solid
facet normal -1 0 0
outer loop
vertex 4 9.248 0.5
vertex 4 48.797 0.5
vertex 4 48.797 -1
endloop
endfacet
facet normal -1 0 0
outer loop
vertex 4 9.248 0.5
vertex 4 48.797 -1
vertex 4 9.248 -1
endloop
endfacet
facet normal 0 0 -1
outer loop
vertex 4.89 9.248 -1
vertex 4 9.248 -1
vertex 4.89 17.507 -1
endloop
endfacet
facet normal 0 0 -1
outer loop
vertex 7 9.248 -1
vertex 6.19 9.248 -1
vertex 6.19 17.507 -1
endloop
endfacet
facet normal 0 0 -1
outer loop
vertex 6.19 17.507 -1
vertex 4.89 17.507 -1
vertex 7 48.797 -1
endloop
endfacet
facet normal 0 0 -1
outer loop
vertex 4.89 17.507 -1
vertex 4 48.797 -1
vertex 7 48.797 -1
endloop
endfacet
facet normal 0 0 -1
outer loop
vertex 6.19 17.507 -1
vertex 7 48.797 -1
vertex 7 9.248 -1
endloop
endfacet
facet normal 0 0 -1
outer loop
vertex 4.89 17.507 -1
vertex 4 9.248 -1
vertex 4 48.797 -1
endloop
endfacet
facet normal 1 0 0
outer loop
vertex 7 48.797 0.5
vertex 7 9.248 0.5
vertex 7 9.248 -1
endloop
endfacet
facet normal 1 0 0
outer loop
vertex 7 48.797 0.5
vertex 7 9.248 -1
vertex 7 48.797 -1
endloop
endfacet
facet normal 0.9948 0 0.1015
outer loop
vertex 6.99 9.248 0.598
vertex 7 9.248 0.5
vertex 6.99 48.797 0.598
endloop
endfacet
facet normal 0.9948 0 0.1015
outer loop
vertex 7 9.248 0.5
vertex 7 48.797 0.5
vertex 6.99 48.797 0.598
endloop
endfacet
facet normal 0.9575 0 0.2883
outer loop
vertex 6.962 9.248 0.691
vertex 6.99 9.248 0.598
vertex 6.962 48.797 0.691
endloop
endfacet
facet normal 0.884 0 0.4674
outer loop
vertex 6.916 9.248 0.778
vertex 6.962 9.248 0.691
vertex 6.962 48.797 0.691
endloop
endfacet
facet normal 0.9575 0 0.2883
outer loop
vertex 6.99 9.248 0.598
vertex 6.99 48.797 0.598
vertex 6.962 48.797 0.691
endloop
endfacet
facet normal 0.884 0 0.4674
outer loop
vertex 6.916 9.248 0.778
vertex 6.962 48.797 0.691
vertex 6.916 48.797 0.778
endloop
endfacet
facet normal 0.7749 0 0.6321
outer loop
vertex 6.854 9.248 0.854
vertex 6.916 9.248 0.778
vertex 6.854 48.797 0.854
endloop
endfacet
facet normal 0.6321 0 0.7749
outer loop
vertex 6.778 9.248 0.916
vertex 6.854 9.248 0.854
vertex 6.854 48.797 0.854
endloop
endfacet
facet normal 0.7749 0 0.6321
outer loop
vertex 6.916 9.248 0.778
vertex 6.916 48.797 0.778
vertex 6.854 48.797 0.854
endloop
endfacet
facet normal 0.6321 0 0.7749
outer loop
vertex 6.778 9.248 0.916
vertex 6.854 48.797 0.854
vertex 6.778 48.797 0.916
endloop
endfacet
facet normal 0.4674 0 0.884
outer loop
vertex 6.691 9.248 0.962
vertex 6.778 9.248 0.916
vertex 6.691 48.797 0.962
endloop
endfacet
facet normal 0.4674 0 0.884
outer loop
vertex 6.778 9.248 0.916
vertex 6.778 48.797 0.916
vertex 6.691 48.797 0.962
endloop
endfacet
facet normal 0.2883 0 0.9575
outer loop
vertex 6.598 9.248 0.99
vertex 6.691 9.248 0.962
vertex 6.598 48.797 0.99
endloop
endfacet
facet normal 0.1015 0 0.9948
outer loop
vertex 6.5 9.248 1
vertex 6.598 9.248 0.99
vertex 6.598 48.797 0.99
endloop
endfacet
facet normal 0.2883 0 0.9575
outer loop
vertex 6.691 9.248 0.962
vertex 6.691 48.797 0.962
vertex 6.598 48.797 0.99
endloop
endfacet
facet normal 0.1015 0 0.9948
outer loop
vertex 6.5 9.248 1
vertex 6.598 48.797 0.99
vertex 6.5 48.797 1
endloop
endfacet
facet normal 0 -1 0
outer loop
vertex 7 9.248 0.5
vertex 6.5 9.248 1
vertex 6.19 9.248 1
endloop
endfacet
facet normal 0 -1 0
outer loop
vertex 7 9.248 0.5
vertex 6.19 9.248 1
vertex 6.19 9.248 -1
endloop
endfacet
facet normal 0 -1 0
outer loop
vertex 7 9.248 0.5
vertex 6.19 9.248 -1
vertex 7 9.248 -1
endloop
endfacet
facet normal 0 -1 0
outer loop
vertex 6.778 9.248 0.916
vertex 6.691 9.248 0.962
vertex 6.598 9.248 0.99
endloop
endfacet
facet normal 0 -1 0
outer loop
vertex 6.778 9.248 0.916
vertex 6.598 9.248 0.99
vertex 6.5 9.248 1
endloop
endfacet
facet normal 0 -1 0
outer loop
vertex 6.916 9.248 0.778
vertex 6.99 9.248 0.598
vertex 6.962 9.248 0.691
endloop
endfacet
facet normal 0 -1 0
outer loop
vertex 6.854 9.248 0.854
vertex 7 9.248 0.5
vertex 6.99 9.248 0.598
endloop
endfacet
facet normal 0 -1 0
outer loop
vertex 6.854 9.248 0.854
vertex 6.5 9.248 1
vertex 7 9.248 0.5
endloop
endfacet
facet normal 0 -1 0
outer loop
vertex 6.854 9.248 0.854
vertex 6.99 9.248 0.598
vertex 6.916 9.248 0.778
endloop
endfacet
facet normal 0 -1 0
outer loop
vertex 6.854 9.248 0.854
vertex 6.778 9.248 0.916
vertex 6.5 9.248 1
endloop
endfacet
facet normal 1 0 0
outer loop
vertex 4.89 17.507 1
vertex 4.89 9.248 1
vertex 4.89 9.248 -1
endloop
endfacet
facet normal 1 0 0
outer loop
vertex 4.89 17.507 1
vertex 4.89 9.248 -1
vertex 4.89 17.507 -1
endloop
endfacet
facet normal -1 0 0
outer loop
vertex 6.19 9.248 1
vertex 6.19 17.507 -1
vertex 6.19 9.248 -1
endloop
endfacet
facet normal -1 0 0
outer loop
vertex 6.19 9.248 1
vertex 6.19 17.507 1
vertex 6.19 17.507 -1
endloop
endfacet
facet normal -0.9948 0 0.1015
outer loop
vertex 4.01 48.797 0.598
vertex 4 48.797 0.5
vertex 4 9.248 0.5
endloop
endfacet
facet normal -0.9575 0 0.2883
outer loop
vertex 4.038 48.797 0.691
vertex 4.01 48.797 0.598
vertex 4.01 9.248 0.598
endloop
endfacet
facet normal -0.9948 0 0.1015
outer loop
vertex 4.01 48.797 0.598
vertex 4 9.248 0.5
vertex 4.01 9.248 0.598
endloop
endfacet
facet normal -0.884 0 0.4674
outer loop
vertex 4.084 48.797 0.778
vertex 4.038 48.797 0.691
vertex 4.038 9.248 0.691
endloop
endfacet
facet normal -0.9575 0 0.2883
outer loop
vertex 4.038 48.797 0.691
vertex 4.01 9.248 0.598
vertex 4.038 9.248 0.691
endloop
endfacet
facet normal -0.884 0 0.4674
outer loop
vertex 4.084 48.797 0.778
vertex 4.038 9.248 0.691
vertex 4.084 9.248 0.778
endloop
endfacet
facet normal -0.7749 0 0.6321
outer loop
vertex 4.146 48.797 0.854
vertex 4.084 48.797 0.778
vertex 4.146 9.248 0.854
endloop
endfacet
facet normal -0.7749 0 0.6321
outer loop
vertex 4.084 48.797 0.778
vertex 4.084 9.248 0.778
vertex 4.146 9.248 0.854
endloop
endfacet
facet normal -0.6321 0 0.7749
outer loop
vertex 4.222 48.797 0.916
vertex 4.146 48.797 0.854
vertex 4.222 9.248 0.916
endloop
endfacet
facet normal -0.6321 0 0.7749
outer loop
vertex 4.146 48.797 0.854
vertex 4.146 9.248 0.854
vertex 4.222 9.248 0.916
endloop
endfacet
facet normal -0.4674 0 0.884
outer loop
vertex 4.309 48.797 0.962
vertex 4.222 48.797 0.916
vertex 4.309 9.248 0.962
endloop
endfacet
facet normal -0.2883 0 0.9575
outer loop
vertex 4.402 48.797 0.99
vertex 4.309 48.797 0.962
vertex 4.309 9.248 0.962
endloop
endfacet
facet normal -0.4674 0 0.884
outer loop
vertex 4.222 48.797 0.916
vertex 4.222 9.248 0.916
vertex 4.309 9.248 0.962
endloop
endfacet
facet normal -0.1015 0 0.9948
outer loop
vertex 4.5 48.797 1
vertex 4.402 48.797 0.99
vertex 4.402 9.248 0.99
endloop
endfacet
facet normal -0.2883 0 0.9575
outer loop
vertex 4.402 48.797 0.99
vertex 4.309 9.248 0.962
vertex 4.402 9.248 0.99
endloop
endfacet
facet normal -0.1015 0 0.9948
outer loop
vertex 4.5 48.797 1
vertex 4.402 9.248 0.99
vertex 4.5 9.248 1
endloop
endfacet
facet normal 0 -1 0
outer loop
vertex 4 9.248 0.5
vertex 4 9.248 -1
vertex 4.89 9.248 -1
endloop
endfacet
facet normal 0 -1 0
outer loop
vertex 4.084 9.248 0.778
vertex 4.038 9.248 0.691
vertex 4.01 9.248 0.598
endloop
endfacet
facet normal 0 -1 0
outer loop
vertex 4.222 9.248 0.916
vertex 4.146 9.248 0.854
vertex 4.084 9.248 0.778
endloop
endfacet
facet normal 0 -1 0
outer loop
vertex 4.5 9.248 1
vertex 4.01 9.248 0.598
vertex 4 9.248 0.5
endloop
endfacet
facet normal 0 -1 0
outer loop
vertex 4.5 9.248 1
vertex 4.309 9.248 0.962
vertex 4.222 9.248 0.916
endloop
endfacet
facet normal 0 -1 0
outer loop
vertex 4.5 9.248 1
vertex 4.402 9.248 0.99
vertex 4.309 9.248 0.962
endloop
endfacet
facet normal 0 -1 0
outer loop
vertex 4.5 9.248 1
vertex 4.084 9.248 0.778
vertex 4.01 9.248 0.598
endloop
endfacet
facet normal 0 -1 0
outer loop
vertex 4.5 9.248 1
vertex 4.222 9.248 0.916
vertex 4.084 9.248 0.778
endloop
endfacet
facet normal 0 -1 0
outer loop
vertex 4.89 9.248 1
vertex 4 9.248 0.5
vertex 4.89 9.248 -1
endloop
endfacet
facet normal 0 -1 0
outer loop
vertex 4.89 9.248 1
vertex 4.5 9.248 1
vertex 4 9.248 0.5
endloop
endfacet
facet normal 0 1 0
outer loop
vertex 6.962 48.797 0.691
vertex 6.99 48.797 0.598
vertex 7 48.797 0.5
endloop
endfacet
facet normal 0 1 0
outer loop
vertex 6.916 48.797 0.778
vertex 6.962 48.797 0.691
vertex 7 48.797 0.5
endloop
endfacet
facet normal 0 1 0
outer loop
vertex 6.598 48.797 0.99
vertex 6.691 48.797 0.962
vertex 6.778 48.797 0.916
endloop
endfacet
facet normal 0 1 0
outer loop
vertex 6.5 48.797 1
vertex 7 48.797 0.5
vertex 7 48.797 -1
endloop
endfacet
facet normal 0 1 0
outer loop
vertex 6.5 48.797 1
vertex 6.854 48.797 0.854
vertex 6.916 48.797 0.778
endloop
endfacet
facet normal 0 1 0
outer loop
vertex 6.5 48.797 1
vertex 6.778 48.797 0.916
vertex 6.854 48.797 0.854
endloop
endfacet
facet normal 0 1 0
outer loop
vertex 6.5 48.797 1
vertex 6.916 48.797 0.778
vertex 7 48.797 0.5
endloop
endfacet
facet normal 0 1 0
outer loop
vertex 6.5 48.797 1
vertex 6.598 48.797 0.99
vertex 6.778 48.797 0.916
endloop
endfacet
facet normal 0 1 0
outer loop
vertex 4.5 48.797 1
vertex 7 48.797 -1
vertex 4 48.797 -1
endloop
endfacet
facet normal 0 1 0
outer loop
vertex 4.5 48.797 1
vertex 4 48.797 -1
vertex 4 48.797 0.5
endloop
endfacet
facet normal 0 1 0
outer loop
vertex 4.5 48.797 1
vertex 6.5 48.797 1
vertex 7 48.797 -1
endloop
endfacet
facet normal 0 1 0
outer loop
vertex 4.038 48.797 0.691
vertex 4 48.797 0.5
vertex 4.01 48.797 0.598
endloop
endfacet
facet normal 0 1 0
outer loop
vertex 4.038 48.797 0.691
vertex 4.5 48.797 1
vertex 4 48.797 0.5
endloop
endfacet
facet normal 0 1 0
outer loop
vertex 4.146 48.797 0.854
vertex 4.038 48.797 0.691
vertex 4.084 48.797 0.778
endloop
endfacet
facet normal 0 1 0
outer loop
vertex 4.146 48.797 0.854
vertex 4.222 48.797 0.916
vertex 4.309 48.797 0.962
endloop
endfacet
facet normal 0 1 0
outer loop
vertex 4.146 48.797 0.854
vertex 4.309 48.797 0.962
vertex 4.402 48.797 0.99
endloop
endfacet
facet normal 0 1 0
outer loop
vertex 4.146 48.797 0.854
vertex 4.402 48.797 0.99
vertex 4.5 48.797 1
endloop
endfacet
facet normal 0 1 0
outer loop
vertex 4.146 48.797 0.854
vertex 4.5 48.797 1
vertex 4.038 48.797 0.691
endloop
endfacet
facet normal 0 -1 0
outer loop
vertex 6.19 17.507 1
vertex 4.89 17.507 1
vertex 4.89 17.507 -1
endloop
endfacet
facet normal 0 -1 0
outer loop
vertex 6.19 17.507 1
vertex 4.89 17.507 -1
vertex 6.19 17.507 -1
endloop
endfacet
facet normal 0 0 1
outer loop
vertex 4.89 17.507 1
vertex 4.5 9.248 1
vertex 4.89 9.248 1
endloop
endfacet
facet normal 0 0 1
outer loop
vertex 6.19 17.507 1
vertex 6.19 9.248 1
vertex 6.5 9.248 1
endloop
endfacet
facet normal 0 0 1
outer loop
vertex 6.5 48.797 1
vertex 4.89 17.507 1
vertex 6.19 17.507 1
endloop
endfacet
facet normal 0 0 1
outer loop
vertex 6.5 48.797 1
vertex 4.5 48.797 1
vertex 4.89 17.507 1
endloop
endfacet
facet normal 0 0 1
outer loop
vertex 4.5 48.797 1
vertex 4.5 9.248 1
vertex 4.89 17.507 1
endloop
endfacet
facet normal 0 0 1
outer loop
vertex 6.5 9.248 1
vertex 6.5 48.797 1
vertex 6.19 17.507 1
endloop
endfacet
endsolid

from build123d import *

# Parameters (mm, degrees)
F1_DEPTH      = 1
F1_DEPTH_BACK = 1
F2_R          = 0.5


with BuildPart() as f1:
    # F0 (on Top) → F1 (new body, two sides)
    with BuildSketch(Plane.XY) as f1_sk:
        Polygon((7, 9.248056), (7, 48.79661), (4, 48.79661), (4, 9.248056), (4.890339, 9.248056), (4.890339, 17.506754), (6.190339, 17.506754), (6.190339, 9.248056), align=None)
    extrude(amount=F1_DEPTH)
    extrude(f1_sk.sketch, amount=-F1_DEPTH_BACK)

    # F2
    f2_edges = [f1.edges().sort_by_distance(p)[0] for p in [
        (4, 29.022333, 1),
        (7, 29.022333, 1),
    ]]
    fillet(f2_edges, radius=F2_R)


solid = f1.part
